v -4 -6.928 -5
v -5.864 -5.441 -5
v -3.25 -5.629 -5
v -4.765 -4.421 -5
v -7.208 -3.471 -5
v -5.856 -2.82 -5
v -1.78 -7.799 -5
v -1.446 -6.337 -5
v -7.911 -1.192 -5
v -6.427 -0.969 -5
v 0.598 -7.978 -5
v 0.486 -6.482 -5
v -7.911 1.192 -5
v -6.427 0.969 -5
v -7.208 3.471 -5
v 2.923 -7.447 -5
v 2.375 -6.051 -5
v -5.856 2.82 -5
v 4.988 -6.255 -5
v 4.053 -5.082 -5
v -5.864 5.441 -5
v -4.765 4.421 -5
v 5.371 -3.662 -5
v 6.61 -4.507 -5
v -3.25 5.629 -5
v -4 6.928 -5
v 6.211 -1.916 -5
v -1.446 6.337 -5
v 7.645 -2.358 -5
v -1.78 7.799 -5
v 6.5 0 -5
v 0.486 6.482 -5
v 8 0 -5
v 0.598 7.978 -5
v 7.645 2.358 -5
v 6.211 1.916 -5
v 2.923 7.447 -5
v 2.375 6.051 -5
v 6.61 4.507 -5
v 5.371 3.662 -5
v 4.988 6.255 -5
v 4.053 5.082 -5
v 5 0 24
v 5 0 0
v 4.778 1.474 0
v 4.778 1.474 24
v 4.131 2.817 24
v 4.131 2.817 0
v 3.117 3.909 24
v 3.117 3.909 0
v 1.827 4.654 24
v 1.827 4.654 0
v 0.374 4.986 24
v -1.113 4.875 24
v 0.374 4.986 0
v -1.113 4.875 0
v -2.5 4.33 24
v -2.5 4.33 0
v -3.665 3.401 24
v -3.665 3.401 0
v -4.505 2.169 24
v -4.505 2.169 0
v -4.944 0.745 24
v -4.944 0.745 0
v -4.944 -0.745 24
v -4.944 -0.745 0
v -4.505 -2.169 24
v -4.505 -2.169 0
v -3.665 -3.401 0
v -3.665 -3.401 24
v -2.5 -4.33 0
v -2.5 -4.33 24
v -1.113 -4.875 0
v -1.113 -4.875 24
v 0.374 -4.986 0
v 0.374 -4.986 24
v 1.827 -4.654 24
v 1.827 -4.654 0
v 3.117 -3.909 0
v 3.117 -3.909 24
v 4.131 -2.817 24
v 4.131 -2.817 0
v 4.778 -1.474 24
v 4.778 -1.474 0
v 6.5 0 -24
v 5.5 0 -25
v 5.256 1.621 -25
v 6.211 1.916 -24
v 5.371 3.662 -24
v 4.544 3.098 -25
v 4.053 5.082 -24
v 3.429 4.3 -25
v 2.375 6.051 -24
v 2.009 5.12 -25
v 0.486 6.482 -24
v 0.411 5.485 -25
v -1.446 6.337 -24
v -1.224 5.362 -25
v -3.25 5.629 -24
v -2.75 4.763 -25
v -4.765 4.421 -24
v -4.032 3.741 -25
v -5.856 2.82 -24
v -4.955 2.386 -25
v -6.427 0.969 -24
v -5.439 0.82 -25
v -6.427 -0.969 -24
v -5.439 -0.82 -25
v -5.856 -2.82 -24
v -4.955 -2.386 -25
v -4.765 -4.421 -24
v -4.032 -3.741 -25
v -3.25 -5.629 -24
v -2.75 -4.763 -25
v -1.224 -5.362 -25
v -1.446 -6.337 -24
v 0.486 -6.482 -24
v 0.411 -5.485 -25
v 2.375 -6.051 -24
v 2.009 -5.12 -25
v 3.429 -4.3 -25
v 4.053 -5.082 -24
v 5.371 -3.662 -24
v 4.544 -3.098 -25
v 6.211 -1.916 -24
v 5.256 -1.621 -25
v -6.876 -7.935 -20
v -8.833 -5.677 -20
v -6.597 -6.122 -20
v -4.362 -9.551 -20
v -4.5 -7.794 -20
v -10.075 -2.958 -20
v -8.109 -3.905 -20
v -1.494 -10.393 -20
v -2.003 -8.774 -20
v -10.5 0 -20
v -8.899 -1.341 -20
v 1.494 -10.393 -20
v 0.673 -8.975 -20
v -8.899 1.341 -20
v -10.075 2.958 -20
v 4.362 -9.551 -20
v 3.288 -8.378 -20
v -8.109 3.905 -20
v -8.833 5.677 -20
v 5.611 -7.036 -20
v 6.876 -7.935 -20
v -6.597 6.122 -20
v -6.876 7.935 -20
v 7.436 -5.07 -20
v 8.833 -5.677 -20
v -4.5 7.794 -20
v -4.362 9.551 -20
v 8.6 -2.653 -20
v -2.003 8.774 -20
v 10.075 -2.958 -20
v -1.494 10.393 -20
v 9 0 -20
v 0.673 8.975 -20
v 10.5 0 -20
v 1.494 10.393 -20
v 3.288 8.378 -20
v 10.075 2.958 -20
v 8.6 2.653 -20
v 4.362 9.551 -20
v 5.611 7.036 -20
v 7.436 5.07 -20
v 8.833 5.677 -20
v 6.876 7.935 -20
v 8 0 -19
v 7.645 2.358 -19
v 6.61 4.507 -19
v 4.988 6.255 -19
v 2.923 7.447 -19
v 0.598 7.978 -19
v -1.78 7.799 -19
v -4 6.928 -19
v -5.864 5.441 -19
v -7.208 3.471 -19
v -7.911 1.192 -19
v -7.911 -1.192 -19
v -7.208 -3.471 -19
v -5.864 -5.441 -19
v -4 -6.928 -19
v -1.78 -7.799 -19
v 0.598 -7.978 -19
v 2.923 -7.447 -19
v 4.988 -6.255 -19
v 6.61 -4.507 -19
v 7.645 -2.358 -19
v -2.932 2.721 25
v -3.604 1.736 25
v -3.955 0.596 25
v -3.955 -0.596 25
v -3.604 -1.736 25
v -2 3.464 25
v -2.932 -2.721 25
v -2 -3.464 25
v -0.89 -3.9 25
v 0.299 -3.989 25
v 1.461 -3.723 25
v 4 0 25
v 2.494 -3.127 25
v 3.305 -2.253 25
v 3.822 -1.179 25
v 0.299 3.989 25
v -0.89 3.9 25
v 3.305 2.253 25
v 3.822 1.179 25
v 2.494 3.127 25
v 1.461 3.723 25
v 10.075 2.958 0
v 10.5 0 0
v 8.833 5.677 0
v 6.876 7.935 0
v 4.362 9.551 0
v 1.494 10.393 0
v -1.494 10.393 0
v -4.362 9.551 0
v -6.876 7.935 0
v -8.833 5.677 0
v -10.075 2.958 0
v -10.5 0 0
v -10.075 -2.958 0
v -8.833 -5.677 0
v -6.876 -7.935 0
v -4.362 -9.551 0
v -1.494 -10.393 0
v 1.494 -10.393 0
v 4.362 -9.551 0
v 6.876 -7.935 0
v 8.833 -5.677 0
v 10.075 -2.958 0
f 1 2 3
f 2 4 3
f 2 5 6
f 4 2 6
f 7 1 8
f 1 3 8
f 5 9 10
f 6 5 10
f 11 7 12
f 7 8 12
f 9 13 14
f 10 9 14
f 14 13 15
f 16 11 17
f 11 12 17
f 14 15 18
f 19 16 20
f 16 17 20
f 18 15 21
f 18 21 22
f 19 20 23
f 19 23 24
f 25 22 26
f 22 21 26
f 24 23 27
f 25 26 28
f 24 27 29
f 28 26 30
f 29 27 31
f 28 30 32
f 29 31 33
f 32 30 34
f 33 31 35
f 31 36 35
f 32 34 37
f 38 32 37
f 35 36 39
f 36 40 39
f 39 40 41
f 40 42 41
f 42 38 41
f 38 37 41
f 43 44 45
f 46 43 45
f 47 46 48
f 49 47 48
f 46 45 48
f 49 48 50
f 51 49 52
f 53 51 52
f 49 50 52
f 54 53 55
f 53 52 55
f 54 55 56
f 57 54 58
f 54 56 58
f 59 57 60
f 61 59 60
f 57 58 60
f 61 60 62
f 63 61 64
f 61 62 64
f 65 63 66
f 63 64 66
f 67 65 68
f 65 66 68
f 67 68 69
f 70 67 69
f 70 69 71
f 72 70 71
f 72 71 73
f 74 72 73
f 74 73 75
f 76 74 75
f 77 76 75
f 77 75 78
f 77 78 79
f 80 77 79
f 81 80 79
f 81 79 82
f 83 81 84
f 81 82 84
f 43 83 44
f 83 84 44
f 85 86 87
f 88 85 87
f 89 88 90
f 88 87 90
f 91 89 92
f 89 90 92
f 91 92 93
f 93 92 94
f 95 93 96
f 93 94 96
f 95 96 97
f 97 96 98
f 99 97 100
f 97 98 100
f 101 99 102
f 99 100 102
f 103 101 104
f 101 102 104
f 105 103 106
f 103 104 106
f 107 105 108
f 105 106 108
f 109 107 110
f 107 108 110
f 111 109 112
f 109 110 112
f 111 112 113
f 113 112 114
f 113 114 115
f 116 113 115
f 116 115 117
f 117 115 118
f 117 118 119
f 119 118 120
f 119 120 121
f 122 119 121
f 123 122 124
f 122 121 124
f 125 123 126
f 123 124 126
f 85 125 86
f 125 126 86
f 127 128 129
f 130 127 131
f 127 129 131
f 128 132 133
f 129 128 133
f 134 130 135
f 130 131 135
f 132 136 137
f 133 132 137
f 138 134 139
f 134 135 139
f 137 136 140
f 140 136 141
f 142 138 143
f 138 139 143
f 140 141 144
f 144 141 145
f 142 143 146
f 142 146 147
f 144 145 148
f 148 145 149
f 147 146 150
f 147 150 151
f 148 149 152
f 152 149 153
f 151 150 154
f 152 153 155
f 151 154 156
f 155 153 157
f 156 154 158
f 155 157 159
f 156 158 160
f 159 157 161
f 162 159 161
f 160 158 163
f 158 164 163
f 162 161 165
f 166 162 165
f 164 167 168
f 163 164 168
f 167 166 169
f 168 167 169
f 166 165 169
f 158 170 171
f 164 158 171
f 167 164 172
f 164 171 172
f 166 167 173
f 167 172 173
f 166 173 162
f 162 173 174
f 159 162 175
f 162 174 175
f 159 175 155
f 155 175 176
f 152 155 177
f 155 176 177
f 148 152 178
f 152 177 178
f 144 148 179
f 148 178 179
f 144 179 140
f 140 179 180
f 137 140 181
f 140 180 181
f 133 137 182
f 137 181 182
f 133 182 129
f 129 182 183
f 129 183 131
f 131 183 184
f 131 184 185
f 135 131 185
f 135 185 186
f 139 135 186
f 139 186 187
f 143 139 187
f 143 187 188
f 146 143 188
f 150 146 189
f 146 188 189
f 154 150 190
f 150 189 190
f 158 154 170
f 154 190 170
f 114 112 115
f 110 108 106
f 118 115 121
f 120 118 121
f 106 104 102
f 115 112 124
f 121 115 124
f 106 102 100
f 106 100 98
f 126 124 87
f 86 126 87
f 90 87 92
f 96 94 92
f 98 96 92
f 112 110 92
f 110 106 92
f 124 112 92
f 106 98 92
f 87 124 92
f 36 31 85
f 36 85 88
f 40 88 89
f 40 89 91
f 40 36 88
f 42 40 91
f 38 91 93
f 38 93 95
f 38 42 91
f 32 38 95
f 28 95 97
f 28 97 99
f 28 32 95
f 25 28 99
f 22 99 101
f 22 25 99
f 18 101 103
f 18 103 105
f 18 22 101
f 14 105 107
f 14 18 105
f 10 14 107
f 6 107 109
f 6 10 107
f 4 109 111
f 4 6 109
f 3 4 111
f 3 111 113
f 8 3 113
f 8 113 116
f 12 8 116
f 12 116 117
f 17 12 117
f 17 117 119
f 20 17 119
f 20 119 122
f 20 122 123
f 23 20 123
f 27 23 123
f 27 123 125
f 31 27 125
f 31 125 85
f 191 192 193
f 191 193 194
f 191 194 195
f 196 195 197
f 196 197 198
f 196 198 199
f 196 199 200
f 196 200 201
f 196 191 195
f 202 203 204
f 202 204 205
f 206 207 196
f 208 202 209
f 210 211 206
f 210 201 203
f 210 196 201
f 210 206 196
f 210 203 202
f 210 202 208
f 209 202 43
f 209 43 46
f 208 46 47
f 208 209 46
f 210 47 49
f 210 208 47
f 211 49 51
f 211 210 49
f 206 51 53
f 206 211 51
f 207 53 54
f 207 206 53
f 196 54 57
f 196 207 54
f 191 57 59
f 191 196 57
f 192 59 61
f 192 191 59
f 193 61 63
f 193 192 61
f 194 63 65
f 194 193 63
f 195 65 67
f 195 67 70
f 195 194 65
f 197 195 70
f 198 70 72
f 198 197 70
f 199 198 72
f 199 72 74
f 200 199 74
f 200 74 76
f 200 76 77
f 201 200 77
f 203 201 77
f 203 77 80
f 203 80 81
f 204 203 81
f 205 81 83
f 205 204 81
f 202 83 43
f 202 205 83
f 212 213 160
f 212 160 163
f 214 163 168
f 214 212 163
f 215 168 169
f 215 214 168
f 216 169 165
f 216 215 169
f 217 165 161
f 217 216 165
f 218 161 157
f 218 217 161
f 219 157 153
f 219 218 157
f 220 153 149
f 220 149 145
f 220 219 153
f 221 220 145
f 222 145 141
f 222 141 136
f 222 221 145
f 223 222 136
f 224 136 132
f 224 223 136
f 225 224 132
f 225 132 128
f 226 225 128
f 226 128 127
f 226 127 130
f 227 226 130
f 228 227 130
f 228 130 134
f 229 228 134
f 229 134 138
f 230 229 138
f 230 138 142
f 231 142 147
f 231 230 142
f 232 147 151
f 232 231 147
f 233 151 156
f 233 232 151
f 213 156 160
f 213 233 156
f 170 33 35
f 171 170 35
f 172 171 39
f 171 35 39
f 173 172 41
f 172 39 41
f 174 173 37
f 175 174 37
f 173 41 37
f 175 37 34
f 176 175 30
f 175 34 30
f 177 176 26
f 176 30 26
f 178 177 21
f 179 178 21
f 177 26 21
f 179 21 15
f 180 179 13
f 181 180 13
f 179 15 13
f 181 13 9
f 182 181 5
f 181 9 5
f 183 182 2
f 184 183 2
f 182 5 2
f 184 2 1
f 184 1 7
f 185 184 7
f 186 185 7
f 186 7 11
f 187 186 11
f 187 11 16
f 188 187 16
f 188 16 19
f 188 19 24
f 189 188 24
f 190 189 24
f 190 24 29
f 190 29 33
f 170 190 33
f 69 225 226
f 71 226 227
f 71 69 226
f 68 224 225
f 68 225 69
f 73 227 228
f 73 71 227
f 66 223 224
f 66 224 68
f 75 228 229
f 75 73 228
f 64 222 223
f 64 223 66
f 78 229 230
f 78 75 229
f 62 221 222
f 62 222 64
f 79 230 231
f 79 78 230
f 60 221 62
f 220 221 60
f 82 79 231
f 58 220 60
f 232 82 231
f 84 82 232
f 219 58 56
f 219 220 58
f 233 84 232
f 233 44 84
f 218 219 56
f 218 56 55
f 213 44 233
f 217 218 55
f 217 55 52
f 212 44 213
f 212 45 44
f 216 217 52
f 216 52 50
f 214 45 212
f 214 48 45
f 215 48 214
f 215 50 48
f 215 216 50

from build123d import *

# Parameters (mm, degrees)
F0_R     = 5
F1_DEPTH = 25
F0_R_2   = 6.5
F2_DEPTH = 25
F0_R_3   = 8
F3_DEPTH = 5
F0_R_4   = 10.5
F4_DEPTH = 20
F5_SIZE  = 1


with BuildPart() as f1:
    # F0 (on Top) → F1 (new body)
    with BuildSketch(Plane.XY):
        Circle(F0_R)
    extrude(amount=F1_DEPTH)

    # F0 (on Top) → F2 (join)
    with BuildSketch(Plane.XY):
        Circle(F0_R_2)
        Circle(F0_R, mode=Mode.SUBTRACT)
        Circle(F0_R)
    extrude(amount=-F2_DEPTH)

    # F0 (on Top) → F3 (join)
    with BuildSketch(Plane.XY):
        Circle(F0_R_3)
        Circle(F0_R_2, mode=Mode.SUBTRACT)
    extrude(amount=-F3_DEPTH)

    # F0 (on Top) → F4 (join)
    with BuildSketch(Plane.XY):
        Circle(F0_R_4)
        Circle(F0_R_3, mode=Mode.SUBTRACT)
    extrude(amount=-F4_DEPTH)

    # F5
    f5_edges = [f1.edges().sort_by_distance(p)[0] for p in [
        (-8, 0, -20),
        (-6.5, 0, -25),
        (-5, 0, 25),
    ]]
    chamfer(f5_edges, length=F5_SIZE)


solid = f1.part
